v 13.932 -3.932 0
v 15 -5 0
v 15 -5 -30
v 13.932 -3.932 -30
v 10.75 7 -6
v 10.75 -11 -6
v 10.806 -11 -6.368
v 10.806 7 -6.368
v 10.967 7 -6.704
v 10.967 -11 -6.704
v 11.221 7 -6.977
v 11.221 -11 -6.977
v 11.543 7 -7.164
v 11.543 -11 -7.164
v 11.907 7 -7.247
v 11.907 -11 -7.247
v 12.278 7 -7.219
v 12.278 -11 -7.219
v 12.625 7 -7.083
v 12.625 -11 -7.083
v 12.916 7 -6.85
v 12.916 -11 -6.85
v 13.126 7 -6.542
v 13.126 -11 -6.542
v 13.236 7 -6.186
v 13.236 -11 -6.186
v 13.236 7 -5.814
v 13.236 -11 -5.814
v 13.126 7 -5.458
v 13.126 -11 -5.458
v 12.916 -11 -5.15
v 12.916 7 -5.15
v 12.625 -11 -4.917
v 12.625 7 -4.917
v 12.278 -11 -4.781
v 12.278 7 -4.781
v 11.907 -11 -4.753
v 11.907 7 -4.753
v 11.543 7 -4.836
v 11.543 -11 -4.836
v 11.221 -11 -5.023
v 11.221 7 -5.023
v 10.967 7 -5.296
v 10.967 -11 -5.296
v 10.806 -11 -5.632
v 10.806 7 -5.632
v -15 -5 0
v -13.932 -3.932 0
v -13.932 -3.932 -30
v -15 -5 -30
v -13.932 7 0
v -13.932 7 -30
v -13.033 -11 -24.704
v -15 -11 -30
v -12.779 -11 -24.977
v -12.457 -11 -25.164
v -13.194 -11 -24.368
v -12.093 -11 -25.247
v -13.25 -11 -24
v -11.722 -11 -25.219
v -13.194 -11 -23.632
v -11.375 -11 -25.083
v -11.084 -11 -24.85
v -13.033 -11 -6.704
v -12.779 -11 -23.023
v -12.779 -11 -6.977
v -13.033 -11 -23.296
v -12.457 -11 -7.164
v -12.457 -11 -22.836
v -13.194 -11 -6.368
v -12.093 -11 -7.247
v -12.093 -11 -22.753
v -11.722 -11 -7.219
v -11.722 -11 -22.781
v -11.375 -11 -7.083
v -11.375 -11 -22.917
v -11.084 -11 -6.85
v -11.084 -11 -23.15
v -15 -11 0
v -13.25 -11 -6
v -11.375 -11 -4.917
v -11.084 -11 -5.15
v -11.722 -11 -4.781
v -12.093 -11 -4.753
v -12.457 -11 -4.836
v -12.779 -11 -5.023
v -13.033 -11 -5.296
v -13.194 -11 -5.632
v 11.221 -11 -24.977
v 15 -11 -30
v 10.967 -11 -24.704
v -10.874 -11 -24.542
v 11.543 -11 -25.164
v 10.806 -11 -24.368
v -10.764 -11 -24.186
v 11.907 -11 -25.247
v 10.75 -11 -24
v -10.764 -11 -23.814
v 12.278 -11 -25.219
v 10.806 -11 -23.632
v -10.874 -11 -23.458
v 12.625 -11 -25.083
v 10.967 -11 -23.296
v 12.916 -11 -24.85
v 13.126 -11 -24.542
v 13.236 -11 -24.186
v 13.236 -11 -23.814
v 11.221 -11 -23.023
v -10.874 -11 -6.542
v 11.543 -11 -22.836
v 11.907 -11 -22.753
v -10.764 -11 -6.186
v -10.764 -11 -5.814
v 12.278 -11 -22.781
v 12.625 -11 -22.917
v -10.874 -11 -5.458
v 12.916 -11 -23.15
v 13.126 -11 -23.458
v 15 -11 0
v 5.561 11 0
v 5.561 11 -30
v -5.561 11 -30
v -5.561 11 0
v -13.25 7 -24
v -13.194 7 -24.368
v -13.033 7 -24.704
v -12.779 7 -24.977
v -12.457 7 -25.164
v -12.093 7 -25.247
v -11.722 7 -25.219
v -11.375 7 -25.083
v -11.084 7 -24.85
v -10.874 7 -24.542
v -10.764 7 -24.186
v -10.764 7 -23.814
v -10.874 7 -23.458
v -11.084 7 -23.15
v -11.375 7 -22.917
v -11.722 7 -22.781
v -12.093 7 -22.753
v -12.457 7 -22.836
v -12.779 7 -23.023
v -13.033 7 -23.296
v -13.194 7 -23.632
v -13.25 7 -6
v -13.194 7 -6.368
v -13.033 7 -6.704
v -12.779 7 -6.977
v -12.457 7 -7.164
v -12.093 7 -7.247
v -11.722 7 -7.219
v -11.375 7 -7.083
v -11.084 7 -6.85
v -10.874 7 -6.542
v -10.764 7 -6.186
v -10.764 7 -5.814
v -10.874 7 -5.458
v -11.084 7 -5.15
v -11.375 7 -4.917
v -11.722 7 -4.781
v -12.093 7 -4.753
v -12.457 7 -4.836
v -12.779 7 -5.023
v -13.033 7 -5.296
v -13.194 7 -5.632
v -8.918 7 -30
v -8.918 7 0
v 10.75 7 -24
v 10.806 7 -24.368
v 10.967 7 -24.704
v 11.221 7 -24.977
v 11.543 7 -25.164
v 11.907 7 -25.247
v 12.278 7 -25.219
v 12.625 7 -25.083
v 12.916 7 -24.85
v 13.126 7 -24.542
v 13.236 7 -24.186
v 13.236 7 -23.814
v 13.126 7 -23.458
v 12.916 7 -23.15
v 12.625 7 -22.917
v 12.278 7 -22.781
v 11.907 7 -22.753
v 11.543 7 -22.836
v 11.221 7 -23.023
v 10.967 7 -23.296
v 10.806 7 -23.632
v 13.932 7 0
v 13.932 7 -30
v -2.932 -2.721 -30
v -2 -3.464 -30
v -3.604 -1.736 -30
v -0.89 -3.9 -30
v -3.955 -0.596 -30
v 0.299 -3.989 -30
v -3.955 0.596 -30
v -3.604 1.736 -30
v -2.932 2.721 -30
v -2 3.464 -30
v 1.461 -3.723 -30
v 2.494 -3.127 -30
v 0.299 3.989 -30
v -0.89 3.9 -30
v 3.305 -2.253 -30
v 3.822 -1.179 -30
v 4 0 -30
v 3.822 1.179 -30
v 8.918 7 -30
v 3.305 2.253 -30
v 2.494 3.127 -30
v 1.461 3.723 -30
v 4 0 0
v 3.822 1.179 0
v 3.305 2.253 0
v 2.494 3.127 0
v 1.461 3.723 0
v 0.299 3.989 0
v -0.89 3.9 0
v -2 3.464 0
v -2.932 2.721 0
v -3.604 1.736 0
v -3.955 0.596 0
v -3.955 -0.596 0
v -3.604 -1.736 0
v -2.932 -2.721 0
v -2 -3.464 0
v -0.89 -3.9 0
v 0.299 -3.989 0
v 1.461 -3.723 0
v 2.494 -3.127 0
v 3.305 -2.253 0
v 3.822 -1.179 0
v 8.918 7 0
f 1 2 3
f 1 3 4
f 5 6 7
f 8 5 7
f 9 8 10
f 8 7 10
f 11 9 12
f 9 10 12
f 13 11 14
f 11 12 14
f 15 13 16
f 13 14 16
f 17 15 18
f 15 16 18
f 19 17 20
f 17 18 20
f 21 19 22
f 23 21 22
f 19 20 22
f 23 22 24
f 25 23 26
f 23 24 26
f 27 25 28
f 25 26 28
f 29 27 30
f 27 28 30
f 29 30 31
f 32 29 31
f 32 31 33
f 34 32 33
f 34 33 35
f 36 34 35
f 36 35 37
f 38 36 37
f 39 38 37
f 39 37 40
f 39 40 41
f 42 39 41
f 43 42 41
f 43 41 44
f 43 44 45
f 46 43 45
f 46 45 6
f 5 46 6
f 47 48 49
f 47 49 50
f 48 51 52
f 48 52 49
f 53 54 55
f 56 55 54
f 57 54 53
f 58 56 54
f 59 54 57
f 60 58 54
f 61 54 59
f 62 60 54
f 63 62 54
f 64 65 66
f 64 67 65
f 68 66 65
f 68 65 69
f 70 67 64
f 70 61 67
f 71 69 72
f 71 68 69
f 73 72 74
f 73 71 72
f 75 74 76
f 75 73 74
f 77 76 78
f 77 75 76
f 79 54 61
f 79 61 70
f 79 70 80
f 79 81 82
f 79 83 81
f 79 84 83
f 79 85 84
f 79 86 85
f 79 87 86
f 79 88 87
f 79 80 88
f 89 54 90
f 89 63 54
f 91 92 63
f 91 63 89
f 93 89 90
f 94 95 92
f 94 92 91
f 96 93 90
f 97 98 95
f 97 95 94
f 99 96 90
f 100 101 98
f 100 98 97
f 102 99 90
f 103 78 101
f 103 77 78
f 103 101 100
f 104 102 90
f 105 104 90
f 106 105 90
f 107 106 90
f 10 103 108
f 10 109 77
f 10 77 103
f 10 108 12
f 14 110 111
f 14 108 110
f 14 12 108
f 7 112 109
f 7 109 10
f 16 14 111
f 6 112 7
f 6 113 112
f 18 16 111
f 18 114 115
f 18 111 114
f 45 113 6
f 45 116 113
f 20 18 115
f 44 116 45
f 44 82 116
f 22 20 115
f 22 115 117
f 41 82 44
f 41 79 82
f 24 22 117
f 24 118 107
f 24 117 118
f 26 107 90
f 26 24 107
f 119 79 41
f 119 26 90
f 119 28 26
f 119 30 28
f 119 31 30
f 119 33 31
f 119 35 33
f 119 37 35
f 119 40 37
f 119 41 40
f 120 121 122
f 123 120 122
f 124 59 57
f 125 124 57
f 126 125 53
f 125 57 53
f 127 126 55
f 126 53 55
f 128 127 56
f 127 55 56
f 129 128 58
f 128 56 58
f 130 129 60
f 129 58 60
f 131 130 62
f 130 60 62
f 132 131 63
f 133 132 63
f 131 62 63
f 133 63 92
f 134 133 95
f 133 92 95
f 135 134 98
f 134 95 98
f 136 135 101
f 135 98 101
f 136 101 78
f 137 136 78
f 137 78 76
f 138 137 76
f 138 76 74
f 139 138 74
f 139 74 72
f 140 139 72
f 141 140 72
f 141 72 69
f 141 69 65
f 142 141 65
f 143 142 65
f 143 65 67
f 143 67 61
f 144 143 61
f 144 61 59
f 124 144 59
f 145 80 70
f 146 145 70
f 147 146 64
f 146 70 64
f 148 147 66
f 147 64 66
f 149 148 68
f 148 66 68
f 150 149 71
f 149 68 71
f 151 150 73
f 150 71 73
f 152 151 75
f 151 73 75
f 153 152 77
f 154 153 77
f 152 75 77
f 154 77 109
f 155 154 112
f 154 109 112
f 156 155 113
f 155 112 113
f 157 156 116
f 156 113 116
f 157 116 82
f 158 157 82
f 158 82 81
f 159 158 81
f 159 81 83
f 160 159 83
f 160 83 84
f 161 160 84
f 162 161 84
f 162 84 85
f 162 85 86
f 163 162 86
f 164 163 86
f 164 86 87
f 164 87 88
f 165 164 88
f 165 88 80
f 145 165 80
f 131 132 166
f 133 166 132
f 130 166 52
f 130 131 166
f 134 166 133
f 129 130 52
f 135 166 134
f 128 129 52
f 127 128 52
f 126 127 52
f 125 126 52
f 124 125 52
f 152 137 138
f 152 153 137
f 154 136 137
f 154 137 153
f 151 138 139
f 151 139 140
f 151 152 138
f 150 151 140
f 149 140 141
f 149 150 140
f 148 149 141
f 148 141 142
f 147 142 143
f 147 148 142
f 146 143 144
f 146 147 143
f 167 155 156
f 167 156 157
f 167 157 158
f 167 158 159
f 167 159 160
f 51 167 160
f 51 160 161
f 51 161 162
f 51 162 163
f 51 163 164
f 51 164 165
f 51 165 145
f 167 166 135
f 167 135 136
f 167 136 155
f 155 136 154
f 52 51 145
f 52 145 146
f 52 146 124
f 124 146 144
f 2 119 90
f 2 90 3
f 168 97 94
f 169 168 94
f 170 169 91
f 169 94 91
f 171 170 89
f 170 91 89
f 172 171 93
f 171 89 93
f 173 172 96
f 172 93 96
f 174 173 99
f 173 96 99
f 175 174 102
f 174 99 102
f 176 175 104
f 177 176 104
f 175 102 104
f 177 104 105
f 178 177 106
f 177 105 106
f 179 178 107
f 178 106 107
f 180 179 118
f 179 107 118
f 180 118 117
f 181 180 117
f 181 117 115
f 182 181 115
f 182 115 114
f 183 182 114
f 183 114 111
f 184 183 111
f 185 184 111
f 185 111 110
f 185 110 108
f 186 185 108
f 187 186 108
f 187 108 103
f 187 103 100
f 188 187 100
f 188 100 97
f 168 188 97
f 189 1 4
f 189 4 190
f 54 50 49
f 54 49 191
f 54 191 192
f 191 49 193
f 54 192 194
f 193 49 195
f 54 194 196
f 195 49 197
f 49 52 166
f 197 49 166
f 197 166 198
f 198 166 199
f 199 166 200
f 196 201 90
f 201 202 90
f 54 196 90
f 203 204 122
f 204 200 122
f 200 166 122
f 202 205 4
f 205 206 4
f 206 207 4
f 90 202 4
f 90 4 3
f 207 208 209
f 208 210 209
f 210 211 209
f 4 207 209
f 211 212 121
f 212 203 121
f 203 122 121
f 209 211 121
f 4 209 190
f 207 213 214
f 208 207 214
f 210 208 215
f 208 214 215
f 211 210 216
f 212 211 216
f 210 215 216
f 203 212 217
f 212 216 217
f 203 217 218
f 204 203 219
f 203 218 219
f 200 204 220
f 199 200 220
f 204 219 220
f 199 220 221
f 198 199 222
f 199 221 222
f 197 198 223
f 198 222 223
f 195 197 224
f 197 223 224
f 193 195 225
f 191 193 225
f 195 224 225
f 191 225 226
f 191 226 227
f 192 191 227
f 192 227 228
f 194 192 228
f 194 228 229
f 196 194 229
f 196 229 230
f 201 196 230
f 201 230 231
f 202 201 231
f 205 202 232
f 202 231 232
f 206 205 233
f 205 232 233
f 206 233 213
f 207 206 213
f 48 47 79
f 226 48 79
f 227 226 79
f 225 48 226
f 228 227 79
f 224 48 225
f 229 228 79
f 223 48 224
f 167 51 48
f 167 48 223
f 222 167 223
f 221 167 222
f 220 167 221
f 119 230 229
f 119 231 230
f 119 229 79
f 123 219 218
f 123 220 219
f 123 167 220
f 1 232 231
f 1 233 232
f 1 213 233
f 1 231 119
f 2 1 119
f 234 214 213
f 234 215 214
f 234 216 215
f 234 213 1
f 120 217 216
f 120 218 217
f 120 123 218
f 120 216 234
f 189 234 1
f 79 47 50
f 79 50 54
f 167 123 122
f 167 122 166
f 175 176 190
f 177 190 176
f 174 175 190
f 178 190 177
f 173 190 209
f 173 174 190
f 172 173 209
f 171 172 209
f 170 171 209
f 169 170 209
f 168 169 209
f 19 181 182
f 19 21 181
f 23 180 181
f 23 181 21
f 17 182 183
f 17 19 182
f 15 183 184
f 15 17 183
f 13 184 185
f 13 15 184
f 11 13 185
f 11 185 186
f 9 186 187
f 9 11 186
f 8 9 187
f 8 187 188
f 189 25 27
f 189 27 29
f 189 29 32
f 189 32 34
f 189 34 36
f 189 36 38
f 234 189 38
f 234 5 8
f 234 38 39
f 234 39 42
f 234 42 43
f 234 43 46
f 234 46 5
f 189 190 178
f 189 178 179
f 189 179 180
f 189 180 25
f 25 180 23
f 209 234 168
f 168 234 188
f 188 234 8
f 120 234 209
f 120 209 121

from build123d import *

# Parameters (mm, degrees)
SKETCH1_R             = 4
BOSS_EXTRUDE1_DEPTH   = 30
F_2_5MM_DOWEL_HOLE1_D = 2.5


with BuildPart() as part:
    # Sketch1 → Boss-Extrude1 (new body)
    with BuildSketch(Plane.XY):
        Polygon((-15, -11), (15, -11), (15, -5), (13.93169164, -3.93169164), (13.93169164, 7), (8.917679795, 7), (5.56128127, 11), (-5.56128127, 11), (-8.917679795, 7), (-13.93169164, 7), (-13.93169164, -3.93169164), (-15, -5), align=None)
        Circle(SKETCH1_R, mode=Mode.SUBTRACT)
    extrude(amount=-BOSS_EXTRUDE1_DEPTH)

    # Ø2.5mm Dowel Hole1 (through all)
    with Locations(Plane(origin=(0, 7, 0), x_dir=(1, 0, 0), z_dir=(0, 1, 0))):
        with Locations((-12, 24), (-12, 6), (12, 6), (12, 24)):
            Hole(F_2_5MM_DOWEL_HOLE1_D / 2)


solid = part.part
